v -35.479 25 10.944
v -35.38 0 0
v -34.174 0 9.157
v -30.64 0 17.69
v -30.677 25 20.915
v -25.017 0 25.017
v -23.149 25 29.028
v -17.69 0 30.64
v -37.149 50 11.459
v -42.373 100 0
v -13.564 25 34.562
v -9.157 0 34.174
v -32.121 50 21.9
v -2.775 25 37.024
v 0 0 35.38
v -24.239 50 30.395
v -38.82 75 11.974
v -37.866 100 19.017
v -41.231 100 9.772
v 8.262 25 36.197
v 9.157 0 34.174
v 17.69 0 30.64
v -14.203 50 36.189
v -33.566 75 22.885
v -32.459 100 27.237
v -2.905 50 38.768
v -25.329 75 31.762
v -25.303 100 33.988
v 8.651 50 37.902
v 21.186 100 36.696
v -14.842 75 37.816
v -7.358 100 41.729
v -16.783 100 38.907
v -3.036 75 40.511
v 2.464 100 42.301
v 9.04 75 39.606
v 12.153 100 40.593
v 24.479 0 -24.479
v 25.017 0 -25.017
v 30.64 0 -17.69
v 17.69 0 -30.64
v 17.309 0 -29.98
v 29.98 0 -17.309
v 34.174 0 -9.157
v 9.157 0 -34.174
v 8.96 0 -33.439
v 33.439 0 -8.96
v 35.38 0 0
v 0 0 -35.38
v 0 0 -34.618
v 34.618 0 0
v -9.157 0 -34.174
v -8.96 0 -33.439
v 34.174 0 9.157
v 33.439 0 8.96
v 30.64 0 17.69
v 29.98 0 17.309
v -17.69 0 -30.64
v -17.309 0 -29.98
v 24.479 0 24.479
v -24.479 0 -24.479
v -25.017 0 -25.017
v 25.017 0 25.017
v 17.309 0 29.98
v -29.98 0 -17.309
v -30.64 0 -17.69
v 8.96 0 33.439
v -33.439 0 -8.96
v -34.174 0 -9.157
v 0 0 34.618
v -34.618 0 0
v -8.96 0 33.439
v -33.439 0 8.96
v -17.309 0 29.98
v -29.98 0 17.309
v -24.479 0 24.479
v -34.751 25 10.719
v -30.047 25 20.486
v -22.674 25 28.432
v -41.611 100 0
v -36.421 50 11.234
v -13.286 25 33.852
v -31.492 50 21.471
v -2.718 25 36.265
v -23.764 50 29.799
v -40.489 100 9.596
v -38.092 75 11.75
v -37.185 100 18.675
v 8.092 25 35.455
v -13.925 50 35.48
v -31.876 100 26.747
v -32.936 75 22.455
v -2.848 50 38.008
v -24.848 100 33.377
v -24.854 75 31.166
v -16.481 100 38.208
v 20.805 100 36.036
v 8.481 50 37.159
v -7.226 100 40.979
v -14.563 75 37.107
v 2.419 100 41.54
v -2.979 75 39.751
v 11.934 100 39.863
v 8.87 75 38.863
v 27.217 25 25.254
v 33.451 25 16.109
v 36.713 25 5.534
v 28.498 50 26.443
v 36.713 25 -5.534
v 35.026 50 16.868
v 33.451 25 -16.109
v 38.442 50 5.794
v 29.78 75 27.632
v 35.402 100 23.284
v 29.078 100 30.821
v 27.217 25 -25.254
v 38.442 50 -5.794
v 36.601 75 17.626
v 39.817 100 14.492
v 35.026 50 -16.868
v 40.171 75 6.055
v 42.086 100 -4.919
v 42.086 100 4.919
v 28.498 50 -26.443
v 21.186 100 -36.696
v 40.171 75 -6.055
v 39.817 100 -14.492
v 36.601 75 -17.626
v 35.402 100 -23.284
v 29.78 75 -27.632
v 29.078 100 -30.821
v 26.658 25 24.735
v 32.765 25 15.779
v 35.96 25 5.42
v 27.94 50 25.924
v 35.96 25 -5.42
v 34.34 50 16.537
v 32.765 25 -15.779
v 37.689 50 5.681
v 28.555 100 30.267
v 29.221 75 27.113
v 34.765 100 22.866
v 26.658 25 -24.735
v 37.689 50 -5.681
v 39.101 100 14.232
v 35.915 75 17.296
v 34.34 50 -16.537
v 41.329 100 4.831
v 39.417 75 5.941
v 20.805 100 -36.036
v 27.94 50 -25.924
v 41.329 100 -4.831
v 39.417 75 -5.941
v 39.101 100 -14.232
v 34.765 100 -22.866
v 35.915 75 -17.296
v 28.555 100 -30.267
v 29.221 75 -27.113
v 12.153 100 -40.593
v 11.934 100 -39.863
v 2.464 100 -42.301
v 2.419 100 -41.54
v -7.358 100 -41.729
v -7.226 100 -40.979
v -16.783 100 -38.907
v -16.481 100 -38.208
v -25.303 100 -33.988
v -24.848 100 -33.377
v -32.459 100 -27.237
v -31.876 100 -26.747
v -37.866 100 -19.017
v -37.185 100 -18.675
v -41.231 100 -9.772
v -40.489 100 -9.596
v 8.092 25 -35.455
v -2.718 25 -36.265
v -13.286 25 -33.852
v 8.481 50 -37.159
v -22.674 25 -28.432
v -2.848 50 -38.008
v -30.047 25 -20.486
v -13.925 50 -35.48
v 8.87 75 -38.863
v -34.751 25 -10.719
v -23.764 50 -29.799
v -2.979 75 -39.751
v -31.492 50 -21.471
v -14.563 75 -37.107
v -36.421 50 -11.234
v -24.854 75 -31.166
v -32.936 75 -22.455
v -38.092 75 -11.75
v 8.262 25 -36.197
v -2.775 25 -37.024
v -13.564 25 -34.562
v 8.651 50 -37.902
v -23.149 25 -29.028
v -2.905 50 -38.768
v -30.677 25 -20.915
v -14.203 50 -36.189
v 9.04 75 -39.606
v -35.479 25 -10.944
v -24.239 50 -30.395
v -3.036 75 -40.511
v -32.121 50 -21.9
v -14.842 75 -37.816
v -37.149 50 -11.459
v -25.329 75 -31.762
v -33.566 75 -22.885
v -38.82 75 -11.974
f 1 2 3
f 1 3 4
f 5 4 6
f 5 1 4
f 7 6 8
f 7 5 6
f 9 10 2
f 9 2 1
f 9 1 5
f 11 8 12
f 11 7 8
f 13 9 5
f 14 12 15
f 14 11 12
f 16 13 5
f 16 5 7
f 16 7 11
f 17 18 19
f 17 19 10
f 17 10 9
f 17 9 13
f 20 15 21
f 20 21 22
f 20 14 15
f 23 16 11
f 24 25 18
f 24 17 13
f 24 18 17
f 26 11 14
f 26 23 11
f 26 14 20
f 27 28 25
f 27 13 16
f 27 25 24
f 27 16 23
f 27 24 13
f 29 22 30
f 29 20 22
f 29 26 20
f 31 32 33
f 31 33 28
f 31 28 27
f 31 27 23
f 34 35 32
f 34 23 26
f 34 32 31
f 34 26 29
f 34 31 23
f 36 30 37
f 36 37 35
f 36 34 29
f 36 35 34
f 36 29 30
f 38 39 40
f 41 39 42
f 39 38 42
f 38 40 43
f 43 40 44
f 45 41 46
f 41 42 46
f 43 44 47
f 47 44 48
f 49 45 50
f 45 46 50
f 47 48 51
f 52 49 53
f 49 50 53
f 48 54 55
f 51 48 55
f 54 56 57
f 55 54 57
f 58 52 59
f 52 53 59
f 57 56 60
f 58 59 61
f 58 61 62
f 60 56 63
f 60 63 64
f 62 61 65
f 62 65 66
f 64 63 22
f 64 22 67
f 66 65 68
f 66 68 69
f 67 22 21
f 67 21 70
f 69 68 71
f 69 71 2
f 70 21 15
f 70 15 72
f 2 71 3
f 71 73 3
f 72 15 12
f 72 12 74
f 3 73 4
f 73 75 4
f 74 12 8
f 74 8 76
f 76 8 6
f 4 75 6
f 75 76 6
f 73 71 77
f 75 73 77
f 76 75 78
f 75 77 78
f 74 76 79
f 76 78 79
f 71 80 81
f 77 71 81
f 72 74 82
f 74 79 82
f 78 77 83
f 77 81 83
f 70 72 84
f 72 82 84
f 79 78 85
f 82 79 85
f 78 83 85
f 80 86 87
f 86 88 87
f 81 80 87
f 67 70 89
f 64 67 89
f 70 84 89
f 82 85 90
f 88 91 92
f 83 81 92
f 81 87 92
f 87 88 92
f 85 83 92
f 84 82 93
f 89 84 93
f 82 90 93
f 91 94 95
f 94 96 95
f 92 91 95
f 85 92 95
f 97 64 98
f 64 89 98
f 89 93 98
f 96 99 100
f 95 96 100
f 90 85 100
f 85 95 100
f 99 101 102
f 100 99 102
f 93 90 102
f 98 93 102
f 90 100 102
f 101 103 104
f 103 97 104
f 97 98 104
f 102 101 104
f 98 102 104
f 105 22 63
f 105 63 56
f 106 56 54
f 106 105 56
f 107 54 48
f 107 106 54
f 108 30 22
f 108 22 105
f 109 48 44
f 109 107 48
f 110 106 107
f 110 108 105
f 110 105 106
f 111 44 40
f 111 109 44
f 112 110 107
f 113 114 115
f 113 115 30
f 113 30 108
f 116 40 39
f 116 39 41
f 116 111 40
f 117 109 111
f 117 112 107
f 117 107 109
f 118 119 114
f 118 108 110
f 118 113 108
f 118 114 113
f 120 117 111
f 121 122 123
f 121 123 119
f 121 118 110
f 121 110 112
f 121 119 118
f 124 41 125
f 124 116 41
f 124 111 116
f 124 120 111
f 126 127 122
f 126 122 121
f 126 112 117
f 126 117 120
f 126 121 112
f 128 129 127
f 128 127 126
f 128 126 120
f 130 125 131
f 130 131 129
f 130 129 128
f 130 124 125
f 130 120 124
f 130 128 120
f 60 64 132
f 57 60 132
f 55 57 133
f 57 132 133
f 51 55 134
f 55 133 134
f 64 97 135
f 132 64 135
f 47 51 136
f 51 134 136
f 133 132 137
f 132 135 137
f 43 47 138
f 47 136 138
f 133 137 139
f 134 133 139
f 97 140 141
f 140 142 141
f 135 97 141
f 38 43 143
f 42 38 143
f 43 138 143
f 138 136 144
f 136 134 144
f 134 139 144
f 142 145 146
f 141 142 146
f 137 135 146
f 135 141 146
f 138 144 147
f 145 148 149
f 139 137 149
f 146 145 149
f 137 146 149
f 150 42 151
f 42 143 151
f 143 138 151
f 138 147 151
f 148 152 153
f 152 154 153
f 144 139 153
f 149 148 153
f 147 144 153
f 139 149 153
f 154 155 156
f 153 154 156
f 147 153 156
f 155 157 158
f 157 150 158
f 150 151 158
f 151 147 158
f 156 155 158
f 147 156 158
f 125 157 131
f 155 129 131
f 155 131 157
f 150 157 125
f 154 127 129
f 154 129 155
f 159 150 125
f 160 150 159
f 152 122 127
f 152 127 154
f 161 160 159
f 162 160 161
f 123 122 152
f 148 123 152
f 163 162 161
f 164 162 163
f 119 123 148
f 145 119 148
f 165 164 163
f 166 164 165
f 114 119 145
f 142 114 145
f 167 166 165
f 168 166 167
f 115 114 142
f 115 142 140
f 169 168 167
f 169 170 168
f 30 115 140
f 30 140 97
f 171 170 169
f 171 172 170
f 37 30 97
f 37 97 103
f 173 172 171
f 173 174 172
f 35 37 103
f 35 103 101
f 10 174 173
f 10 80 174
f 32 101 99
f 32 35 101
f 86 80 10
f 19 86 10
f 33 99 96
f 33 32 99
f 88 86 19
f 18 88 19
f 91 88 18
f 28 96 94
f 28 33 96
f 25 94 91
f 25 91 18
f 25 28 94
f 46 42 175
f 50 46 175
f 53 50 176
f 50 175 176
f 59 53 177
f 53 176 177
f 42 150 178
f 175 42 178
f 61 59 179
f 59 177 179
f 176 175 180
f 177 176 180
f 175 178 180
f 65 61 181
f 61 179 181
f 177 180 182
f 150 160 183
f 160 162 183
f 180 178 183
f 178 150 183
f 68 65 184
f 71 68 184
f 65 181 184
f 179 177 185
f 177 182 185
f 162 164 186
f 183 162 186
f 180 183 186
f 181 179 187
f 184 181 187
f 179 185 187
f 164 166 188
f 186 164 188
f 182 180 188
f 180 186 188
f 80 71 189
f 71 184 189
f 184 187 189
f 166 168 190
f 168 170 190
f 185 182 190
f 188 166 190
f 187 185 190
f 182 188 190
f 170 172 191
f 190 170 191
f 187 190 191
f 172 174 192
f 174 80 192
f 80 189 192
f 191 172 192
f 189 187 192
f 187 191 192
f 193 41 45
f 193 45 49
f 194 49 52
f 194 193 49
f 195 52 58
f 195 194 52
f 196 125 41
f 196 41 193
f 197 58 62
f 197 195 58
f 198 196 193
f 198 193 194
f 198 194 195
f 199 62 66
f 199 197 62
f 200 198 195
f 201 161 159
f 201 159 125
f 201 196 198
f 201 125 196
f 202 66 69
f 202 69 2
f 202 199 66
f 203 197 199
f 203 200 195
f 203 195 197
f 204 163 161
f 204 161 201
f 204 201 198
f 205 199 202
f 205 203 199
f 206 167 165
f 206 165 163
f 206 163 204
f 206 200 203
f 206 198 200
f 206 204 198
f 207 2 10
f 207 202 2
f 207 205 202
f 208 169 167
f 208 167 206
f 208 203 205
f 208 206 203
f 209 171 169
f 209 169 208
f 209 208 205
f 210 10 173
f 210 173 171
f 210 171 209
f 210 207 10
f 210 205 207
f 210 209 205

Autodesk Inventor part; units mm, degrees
ref_plane "YZ Plane" through (0, 0, 0) normal (1, 0, 0) x (0, 1, 0)
ref_plane "XZ Plane" through (0, 0, 0) normal (0, 1, 0) x (-1, 0, 0)
ref_plane "XY Plane" through (0, 0, 0) normal (0, 0, 1) x (1, 0, 0)
sketch "Sketch1" plane through (0, 0, 0) normal (0, 1, 0) x (-1, 0, 0)
  circle A0 centre (0, 0) radius 35.38
  dimension "d0" = 70.76
extrude "Extrusion1" add sketch "Sketch1" along normal blind 100 draft 4
shell "Shell1" thickness 0.76 removed faces 2 at (-8.491, 0, -6.3213) at (-14.5373, 100, 13.4329)
properties part number "A"
